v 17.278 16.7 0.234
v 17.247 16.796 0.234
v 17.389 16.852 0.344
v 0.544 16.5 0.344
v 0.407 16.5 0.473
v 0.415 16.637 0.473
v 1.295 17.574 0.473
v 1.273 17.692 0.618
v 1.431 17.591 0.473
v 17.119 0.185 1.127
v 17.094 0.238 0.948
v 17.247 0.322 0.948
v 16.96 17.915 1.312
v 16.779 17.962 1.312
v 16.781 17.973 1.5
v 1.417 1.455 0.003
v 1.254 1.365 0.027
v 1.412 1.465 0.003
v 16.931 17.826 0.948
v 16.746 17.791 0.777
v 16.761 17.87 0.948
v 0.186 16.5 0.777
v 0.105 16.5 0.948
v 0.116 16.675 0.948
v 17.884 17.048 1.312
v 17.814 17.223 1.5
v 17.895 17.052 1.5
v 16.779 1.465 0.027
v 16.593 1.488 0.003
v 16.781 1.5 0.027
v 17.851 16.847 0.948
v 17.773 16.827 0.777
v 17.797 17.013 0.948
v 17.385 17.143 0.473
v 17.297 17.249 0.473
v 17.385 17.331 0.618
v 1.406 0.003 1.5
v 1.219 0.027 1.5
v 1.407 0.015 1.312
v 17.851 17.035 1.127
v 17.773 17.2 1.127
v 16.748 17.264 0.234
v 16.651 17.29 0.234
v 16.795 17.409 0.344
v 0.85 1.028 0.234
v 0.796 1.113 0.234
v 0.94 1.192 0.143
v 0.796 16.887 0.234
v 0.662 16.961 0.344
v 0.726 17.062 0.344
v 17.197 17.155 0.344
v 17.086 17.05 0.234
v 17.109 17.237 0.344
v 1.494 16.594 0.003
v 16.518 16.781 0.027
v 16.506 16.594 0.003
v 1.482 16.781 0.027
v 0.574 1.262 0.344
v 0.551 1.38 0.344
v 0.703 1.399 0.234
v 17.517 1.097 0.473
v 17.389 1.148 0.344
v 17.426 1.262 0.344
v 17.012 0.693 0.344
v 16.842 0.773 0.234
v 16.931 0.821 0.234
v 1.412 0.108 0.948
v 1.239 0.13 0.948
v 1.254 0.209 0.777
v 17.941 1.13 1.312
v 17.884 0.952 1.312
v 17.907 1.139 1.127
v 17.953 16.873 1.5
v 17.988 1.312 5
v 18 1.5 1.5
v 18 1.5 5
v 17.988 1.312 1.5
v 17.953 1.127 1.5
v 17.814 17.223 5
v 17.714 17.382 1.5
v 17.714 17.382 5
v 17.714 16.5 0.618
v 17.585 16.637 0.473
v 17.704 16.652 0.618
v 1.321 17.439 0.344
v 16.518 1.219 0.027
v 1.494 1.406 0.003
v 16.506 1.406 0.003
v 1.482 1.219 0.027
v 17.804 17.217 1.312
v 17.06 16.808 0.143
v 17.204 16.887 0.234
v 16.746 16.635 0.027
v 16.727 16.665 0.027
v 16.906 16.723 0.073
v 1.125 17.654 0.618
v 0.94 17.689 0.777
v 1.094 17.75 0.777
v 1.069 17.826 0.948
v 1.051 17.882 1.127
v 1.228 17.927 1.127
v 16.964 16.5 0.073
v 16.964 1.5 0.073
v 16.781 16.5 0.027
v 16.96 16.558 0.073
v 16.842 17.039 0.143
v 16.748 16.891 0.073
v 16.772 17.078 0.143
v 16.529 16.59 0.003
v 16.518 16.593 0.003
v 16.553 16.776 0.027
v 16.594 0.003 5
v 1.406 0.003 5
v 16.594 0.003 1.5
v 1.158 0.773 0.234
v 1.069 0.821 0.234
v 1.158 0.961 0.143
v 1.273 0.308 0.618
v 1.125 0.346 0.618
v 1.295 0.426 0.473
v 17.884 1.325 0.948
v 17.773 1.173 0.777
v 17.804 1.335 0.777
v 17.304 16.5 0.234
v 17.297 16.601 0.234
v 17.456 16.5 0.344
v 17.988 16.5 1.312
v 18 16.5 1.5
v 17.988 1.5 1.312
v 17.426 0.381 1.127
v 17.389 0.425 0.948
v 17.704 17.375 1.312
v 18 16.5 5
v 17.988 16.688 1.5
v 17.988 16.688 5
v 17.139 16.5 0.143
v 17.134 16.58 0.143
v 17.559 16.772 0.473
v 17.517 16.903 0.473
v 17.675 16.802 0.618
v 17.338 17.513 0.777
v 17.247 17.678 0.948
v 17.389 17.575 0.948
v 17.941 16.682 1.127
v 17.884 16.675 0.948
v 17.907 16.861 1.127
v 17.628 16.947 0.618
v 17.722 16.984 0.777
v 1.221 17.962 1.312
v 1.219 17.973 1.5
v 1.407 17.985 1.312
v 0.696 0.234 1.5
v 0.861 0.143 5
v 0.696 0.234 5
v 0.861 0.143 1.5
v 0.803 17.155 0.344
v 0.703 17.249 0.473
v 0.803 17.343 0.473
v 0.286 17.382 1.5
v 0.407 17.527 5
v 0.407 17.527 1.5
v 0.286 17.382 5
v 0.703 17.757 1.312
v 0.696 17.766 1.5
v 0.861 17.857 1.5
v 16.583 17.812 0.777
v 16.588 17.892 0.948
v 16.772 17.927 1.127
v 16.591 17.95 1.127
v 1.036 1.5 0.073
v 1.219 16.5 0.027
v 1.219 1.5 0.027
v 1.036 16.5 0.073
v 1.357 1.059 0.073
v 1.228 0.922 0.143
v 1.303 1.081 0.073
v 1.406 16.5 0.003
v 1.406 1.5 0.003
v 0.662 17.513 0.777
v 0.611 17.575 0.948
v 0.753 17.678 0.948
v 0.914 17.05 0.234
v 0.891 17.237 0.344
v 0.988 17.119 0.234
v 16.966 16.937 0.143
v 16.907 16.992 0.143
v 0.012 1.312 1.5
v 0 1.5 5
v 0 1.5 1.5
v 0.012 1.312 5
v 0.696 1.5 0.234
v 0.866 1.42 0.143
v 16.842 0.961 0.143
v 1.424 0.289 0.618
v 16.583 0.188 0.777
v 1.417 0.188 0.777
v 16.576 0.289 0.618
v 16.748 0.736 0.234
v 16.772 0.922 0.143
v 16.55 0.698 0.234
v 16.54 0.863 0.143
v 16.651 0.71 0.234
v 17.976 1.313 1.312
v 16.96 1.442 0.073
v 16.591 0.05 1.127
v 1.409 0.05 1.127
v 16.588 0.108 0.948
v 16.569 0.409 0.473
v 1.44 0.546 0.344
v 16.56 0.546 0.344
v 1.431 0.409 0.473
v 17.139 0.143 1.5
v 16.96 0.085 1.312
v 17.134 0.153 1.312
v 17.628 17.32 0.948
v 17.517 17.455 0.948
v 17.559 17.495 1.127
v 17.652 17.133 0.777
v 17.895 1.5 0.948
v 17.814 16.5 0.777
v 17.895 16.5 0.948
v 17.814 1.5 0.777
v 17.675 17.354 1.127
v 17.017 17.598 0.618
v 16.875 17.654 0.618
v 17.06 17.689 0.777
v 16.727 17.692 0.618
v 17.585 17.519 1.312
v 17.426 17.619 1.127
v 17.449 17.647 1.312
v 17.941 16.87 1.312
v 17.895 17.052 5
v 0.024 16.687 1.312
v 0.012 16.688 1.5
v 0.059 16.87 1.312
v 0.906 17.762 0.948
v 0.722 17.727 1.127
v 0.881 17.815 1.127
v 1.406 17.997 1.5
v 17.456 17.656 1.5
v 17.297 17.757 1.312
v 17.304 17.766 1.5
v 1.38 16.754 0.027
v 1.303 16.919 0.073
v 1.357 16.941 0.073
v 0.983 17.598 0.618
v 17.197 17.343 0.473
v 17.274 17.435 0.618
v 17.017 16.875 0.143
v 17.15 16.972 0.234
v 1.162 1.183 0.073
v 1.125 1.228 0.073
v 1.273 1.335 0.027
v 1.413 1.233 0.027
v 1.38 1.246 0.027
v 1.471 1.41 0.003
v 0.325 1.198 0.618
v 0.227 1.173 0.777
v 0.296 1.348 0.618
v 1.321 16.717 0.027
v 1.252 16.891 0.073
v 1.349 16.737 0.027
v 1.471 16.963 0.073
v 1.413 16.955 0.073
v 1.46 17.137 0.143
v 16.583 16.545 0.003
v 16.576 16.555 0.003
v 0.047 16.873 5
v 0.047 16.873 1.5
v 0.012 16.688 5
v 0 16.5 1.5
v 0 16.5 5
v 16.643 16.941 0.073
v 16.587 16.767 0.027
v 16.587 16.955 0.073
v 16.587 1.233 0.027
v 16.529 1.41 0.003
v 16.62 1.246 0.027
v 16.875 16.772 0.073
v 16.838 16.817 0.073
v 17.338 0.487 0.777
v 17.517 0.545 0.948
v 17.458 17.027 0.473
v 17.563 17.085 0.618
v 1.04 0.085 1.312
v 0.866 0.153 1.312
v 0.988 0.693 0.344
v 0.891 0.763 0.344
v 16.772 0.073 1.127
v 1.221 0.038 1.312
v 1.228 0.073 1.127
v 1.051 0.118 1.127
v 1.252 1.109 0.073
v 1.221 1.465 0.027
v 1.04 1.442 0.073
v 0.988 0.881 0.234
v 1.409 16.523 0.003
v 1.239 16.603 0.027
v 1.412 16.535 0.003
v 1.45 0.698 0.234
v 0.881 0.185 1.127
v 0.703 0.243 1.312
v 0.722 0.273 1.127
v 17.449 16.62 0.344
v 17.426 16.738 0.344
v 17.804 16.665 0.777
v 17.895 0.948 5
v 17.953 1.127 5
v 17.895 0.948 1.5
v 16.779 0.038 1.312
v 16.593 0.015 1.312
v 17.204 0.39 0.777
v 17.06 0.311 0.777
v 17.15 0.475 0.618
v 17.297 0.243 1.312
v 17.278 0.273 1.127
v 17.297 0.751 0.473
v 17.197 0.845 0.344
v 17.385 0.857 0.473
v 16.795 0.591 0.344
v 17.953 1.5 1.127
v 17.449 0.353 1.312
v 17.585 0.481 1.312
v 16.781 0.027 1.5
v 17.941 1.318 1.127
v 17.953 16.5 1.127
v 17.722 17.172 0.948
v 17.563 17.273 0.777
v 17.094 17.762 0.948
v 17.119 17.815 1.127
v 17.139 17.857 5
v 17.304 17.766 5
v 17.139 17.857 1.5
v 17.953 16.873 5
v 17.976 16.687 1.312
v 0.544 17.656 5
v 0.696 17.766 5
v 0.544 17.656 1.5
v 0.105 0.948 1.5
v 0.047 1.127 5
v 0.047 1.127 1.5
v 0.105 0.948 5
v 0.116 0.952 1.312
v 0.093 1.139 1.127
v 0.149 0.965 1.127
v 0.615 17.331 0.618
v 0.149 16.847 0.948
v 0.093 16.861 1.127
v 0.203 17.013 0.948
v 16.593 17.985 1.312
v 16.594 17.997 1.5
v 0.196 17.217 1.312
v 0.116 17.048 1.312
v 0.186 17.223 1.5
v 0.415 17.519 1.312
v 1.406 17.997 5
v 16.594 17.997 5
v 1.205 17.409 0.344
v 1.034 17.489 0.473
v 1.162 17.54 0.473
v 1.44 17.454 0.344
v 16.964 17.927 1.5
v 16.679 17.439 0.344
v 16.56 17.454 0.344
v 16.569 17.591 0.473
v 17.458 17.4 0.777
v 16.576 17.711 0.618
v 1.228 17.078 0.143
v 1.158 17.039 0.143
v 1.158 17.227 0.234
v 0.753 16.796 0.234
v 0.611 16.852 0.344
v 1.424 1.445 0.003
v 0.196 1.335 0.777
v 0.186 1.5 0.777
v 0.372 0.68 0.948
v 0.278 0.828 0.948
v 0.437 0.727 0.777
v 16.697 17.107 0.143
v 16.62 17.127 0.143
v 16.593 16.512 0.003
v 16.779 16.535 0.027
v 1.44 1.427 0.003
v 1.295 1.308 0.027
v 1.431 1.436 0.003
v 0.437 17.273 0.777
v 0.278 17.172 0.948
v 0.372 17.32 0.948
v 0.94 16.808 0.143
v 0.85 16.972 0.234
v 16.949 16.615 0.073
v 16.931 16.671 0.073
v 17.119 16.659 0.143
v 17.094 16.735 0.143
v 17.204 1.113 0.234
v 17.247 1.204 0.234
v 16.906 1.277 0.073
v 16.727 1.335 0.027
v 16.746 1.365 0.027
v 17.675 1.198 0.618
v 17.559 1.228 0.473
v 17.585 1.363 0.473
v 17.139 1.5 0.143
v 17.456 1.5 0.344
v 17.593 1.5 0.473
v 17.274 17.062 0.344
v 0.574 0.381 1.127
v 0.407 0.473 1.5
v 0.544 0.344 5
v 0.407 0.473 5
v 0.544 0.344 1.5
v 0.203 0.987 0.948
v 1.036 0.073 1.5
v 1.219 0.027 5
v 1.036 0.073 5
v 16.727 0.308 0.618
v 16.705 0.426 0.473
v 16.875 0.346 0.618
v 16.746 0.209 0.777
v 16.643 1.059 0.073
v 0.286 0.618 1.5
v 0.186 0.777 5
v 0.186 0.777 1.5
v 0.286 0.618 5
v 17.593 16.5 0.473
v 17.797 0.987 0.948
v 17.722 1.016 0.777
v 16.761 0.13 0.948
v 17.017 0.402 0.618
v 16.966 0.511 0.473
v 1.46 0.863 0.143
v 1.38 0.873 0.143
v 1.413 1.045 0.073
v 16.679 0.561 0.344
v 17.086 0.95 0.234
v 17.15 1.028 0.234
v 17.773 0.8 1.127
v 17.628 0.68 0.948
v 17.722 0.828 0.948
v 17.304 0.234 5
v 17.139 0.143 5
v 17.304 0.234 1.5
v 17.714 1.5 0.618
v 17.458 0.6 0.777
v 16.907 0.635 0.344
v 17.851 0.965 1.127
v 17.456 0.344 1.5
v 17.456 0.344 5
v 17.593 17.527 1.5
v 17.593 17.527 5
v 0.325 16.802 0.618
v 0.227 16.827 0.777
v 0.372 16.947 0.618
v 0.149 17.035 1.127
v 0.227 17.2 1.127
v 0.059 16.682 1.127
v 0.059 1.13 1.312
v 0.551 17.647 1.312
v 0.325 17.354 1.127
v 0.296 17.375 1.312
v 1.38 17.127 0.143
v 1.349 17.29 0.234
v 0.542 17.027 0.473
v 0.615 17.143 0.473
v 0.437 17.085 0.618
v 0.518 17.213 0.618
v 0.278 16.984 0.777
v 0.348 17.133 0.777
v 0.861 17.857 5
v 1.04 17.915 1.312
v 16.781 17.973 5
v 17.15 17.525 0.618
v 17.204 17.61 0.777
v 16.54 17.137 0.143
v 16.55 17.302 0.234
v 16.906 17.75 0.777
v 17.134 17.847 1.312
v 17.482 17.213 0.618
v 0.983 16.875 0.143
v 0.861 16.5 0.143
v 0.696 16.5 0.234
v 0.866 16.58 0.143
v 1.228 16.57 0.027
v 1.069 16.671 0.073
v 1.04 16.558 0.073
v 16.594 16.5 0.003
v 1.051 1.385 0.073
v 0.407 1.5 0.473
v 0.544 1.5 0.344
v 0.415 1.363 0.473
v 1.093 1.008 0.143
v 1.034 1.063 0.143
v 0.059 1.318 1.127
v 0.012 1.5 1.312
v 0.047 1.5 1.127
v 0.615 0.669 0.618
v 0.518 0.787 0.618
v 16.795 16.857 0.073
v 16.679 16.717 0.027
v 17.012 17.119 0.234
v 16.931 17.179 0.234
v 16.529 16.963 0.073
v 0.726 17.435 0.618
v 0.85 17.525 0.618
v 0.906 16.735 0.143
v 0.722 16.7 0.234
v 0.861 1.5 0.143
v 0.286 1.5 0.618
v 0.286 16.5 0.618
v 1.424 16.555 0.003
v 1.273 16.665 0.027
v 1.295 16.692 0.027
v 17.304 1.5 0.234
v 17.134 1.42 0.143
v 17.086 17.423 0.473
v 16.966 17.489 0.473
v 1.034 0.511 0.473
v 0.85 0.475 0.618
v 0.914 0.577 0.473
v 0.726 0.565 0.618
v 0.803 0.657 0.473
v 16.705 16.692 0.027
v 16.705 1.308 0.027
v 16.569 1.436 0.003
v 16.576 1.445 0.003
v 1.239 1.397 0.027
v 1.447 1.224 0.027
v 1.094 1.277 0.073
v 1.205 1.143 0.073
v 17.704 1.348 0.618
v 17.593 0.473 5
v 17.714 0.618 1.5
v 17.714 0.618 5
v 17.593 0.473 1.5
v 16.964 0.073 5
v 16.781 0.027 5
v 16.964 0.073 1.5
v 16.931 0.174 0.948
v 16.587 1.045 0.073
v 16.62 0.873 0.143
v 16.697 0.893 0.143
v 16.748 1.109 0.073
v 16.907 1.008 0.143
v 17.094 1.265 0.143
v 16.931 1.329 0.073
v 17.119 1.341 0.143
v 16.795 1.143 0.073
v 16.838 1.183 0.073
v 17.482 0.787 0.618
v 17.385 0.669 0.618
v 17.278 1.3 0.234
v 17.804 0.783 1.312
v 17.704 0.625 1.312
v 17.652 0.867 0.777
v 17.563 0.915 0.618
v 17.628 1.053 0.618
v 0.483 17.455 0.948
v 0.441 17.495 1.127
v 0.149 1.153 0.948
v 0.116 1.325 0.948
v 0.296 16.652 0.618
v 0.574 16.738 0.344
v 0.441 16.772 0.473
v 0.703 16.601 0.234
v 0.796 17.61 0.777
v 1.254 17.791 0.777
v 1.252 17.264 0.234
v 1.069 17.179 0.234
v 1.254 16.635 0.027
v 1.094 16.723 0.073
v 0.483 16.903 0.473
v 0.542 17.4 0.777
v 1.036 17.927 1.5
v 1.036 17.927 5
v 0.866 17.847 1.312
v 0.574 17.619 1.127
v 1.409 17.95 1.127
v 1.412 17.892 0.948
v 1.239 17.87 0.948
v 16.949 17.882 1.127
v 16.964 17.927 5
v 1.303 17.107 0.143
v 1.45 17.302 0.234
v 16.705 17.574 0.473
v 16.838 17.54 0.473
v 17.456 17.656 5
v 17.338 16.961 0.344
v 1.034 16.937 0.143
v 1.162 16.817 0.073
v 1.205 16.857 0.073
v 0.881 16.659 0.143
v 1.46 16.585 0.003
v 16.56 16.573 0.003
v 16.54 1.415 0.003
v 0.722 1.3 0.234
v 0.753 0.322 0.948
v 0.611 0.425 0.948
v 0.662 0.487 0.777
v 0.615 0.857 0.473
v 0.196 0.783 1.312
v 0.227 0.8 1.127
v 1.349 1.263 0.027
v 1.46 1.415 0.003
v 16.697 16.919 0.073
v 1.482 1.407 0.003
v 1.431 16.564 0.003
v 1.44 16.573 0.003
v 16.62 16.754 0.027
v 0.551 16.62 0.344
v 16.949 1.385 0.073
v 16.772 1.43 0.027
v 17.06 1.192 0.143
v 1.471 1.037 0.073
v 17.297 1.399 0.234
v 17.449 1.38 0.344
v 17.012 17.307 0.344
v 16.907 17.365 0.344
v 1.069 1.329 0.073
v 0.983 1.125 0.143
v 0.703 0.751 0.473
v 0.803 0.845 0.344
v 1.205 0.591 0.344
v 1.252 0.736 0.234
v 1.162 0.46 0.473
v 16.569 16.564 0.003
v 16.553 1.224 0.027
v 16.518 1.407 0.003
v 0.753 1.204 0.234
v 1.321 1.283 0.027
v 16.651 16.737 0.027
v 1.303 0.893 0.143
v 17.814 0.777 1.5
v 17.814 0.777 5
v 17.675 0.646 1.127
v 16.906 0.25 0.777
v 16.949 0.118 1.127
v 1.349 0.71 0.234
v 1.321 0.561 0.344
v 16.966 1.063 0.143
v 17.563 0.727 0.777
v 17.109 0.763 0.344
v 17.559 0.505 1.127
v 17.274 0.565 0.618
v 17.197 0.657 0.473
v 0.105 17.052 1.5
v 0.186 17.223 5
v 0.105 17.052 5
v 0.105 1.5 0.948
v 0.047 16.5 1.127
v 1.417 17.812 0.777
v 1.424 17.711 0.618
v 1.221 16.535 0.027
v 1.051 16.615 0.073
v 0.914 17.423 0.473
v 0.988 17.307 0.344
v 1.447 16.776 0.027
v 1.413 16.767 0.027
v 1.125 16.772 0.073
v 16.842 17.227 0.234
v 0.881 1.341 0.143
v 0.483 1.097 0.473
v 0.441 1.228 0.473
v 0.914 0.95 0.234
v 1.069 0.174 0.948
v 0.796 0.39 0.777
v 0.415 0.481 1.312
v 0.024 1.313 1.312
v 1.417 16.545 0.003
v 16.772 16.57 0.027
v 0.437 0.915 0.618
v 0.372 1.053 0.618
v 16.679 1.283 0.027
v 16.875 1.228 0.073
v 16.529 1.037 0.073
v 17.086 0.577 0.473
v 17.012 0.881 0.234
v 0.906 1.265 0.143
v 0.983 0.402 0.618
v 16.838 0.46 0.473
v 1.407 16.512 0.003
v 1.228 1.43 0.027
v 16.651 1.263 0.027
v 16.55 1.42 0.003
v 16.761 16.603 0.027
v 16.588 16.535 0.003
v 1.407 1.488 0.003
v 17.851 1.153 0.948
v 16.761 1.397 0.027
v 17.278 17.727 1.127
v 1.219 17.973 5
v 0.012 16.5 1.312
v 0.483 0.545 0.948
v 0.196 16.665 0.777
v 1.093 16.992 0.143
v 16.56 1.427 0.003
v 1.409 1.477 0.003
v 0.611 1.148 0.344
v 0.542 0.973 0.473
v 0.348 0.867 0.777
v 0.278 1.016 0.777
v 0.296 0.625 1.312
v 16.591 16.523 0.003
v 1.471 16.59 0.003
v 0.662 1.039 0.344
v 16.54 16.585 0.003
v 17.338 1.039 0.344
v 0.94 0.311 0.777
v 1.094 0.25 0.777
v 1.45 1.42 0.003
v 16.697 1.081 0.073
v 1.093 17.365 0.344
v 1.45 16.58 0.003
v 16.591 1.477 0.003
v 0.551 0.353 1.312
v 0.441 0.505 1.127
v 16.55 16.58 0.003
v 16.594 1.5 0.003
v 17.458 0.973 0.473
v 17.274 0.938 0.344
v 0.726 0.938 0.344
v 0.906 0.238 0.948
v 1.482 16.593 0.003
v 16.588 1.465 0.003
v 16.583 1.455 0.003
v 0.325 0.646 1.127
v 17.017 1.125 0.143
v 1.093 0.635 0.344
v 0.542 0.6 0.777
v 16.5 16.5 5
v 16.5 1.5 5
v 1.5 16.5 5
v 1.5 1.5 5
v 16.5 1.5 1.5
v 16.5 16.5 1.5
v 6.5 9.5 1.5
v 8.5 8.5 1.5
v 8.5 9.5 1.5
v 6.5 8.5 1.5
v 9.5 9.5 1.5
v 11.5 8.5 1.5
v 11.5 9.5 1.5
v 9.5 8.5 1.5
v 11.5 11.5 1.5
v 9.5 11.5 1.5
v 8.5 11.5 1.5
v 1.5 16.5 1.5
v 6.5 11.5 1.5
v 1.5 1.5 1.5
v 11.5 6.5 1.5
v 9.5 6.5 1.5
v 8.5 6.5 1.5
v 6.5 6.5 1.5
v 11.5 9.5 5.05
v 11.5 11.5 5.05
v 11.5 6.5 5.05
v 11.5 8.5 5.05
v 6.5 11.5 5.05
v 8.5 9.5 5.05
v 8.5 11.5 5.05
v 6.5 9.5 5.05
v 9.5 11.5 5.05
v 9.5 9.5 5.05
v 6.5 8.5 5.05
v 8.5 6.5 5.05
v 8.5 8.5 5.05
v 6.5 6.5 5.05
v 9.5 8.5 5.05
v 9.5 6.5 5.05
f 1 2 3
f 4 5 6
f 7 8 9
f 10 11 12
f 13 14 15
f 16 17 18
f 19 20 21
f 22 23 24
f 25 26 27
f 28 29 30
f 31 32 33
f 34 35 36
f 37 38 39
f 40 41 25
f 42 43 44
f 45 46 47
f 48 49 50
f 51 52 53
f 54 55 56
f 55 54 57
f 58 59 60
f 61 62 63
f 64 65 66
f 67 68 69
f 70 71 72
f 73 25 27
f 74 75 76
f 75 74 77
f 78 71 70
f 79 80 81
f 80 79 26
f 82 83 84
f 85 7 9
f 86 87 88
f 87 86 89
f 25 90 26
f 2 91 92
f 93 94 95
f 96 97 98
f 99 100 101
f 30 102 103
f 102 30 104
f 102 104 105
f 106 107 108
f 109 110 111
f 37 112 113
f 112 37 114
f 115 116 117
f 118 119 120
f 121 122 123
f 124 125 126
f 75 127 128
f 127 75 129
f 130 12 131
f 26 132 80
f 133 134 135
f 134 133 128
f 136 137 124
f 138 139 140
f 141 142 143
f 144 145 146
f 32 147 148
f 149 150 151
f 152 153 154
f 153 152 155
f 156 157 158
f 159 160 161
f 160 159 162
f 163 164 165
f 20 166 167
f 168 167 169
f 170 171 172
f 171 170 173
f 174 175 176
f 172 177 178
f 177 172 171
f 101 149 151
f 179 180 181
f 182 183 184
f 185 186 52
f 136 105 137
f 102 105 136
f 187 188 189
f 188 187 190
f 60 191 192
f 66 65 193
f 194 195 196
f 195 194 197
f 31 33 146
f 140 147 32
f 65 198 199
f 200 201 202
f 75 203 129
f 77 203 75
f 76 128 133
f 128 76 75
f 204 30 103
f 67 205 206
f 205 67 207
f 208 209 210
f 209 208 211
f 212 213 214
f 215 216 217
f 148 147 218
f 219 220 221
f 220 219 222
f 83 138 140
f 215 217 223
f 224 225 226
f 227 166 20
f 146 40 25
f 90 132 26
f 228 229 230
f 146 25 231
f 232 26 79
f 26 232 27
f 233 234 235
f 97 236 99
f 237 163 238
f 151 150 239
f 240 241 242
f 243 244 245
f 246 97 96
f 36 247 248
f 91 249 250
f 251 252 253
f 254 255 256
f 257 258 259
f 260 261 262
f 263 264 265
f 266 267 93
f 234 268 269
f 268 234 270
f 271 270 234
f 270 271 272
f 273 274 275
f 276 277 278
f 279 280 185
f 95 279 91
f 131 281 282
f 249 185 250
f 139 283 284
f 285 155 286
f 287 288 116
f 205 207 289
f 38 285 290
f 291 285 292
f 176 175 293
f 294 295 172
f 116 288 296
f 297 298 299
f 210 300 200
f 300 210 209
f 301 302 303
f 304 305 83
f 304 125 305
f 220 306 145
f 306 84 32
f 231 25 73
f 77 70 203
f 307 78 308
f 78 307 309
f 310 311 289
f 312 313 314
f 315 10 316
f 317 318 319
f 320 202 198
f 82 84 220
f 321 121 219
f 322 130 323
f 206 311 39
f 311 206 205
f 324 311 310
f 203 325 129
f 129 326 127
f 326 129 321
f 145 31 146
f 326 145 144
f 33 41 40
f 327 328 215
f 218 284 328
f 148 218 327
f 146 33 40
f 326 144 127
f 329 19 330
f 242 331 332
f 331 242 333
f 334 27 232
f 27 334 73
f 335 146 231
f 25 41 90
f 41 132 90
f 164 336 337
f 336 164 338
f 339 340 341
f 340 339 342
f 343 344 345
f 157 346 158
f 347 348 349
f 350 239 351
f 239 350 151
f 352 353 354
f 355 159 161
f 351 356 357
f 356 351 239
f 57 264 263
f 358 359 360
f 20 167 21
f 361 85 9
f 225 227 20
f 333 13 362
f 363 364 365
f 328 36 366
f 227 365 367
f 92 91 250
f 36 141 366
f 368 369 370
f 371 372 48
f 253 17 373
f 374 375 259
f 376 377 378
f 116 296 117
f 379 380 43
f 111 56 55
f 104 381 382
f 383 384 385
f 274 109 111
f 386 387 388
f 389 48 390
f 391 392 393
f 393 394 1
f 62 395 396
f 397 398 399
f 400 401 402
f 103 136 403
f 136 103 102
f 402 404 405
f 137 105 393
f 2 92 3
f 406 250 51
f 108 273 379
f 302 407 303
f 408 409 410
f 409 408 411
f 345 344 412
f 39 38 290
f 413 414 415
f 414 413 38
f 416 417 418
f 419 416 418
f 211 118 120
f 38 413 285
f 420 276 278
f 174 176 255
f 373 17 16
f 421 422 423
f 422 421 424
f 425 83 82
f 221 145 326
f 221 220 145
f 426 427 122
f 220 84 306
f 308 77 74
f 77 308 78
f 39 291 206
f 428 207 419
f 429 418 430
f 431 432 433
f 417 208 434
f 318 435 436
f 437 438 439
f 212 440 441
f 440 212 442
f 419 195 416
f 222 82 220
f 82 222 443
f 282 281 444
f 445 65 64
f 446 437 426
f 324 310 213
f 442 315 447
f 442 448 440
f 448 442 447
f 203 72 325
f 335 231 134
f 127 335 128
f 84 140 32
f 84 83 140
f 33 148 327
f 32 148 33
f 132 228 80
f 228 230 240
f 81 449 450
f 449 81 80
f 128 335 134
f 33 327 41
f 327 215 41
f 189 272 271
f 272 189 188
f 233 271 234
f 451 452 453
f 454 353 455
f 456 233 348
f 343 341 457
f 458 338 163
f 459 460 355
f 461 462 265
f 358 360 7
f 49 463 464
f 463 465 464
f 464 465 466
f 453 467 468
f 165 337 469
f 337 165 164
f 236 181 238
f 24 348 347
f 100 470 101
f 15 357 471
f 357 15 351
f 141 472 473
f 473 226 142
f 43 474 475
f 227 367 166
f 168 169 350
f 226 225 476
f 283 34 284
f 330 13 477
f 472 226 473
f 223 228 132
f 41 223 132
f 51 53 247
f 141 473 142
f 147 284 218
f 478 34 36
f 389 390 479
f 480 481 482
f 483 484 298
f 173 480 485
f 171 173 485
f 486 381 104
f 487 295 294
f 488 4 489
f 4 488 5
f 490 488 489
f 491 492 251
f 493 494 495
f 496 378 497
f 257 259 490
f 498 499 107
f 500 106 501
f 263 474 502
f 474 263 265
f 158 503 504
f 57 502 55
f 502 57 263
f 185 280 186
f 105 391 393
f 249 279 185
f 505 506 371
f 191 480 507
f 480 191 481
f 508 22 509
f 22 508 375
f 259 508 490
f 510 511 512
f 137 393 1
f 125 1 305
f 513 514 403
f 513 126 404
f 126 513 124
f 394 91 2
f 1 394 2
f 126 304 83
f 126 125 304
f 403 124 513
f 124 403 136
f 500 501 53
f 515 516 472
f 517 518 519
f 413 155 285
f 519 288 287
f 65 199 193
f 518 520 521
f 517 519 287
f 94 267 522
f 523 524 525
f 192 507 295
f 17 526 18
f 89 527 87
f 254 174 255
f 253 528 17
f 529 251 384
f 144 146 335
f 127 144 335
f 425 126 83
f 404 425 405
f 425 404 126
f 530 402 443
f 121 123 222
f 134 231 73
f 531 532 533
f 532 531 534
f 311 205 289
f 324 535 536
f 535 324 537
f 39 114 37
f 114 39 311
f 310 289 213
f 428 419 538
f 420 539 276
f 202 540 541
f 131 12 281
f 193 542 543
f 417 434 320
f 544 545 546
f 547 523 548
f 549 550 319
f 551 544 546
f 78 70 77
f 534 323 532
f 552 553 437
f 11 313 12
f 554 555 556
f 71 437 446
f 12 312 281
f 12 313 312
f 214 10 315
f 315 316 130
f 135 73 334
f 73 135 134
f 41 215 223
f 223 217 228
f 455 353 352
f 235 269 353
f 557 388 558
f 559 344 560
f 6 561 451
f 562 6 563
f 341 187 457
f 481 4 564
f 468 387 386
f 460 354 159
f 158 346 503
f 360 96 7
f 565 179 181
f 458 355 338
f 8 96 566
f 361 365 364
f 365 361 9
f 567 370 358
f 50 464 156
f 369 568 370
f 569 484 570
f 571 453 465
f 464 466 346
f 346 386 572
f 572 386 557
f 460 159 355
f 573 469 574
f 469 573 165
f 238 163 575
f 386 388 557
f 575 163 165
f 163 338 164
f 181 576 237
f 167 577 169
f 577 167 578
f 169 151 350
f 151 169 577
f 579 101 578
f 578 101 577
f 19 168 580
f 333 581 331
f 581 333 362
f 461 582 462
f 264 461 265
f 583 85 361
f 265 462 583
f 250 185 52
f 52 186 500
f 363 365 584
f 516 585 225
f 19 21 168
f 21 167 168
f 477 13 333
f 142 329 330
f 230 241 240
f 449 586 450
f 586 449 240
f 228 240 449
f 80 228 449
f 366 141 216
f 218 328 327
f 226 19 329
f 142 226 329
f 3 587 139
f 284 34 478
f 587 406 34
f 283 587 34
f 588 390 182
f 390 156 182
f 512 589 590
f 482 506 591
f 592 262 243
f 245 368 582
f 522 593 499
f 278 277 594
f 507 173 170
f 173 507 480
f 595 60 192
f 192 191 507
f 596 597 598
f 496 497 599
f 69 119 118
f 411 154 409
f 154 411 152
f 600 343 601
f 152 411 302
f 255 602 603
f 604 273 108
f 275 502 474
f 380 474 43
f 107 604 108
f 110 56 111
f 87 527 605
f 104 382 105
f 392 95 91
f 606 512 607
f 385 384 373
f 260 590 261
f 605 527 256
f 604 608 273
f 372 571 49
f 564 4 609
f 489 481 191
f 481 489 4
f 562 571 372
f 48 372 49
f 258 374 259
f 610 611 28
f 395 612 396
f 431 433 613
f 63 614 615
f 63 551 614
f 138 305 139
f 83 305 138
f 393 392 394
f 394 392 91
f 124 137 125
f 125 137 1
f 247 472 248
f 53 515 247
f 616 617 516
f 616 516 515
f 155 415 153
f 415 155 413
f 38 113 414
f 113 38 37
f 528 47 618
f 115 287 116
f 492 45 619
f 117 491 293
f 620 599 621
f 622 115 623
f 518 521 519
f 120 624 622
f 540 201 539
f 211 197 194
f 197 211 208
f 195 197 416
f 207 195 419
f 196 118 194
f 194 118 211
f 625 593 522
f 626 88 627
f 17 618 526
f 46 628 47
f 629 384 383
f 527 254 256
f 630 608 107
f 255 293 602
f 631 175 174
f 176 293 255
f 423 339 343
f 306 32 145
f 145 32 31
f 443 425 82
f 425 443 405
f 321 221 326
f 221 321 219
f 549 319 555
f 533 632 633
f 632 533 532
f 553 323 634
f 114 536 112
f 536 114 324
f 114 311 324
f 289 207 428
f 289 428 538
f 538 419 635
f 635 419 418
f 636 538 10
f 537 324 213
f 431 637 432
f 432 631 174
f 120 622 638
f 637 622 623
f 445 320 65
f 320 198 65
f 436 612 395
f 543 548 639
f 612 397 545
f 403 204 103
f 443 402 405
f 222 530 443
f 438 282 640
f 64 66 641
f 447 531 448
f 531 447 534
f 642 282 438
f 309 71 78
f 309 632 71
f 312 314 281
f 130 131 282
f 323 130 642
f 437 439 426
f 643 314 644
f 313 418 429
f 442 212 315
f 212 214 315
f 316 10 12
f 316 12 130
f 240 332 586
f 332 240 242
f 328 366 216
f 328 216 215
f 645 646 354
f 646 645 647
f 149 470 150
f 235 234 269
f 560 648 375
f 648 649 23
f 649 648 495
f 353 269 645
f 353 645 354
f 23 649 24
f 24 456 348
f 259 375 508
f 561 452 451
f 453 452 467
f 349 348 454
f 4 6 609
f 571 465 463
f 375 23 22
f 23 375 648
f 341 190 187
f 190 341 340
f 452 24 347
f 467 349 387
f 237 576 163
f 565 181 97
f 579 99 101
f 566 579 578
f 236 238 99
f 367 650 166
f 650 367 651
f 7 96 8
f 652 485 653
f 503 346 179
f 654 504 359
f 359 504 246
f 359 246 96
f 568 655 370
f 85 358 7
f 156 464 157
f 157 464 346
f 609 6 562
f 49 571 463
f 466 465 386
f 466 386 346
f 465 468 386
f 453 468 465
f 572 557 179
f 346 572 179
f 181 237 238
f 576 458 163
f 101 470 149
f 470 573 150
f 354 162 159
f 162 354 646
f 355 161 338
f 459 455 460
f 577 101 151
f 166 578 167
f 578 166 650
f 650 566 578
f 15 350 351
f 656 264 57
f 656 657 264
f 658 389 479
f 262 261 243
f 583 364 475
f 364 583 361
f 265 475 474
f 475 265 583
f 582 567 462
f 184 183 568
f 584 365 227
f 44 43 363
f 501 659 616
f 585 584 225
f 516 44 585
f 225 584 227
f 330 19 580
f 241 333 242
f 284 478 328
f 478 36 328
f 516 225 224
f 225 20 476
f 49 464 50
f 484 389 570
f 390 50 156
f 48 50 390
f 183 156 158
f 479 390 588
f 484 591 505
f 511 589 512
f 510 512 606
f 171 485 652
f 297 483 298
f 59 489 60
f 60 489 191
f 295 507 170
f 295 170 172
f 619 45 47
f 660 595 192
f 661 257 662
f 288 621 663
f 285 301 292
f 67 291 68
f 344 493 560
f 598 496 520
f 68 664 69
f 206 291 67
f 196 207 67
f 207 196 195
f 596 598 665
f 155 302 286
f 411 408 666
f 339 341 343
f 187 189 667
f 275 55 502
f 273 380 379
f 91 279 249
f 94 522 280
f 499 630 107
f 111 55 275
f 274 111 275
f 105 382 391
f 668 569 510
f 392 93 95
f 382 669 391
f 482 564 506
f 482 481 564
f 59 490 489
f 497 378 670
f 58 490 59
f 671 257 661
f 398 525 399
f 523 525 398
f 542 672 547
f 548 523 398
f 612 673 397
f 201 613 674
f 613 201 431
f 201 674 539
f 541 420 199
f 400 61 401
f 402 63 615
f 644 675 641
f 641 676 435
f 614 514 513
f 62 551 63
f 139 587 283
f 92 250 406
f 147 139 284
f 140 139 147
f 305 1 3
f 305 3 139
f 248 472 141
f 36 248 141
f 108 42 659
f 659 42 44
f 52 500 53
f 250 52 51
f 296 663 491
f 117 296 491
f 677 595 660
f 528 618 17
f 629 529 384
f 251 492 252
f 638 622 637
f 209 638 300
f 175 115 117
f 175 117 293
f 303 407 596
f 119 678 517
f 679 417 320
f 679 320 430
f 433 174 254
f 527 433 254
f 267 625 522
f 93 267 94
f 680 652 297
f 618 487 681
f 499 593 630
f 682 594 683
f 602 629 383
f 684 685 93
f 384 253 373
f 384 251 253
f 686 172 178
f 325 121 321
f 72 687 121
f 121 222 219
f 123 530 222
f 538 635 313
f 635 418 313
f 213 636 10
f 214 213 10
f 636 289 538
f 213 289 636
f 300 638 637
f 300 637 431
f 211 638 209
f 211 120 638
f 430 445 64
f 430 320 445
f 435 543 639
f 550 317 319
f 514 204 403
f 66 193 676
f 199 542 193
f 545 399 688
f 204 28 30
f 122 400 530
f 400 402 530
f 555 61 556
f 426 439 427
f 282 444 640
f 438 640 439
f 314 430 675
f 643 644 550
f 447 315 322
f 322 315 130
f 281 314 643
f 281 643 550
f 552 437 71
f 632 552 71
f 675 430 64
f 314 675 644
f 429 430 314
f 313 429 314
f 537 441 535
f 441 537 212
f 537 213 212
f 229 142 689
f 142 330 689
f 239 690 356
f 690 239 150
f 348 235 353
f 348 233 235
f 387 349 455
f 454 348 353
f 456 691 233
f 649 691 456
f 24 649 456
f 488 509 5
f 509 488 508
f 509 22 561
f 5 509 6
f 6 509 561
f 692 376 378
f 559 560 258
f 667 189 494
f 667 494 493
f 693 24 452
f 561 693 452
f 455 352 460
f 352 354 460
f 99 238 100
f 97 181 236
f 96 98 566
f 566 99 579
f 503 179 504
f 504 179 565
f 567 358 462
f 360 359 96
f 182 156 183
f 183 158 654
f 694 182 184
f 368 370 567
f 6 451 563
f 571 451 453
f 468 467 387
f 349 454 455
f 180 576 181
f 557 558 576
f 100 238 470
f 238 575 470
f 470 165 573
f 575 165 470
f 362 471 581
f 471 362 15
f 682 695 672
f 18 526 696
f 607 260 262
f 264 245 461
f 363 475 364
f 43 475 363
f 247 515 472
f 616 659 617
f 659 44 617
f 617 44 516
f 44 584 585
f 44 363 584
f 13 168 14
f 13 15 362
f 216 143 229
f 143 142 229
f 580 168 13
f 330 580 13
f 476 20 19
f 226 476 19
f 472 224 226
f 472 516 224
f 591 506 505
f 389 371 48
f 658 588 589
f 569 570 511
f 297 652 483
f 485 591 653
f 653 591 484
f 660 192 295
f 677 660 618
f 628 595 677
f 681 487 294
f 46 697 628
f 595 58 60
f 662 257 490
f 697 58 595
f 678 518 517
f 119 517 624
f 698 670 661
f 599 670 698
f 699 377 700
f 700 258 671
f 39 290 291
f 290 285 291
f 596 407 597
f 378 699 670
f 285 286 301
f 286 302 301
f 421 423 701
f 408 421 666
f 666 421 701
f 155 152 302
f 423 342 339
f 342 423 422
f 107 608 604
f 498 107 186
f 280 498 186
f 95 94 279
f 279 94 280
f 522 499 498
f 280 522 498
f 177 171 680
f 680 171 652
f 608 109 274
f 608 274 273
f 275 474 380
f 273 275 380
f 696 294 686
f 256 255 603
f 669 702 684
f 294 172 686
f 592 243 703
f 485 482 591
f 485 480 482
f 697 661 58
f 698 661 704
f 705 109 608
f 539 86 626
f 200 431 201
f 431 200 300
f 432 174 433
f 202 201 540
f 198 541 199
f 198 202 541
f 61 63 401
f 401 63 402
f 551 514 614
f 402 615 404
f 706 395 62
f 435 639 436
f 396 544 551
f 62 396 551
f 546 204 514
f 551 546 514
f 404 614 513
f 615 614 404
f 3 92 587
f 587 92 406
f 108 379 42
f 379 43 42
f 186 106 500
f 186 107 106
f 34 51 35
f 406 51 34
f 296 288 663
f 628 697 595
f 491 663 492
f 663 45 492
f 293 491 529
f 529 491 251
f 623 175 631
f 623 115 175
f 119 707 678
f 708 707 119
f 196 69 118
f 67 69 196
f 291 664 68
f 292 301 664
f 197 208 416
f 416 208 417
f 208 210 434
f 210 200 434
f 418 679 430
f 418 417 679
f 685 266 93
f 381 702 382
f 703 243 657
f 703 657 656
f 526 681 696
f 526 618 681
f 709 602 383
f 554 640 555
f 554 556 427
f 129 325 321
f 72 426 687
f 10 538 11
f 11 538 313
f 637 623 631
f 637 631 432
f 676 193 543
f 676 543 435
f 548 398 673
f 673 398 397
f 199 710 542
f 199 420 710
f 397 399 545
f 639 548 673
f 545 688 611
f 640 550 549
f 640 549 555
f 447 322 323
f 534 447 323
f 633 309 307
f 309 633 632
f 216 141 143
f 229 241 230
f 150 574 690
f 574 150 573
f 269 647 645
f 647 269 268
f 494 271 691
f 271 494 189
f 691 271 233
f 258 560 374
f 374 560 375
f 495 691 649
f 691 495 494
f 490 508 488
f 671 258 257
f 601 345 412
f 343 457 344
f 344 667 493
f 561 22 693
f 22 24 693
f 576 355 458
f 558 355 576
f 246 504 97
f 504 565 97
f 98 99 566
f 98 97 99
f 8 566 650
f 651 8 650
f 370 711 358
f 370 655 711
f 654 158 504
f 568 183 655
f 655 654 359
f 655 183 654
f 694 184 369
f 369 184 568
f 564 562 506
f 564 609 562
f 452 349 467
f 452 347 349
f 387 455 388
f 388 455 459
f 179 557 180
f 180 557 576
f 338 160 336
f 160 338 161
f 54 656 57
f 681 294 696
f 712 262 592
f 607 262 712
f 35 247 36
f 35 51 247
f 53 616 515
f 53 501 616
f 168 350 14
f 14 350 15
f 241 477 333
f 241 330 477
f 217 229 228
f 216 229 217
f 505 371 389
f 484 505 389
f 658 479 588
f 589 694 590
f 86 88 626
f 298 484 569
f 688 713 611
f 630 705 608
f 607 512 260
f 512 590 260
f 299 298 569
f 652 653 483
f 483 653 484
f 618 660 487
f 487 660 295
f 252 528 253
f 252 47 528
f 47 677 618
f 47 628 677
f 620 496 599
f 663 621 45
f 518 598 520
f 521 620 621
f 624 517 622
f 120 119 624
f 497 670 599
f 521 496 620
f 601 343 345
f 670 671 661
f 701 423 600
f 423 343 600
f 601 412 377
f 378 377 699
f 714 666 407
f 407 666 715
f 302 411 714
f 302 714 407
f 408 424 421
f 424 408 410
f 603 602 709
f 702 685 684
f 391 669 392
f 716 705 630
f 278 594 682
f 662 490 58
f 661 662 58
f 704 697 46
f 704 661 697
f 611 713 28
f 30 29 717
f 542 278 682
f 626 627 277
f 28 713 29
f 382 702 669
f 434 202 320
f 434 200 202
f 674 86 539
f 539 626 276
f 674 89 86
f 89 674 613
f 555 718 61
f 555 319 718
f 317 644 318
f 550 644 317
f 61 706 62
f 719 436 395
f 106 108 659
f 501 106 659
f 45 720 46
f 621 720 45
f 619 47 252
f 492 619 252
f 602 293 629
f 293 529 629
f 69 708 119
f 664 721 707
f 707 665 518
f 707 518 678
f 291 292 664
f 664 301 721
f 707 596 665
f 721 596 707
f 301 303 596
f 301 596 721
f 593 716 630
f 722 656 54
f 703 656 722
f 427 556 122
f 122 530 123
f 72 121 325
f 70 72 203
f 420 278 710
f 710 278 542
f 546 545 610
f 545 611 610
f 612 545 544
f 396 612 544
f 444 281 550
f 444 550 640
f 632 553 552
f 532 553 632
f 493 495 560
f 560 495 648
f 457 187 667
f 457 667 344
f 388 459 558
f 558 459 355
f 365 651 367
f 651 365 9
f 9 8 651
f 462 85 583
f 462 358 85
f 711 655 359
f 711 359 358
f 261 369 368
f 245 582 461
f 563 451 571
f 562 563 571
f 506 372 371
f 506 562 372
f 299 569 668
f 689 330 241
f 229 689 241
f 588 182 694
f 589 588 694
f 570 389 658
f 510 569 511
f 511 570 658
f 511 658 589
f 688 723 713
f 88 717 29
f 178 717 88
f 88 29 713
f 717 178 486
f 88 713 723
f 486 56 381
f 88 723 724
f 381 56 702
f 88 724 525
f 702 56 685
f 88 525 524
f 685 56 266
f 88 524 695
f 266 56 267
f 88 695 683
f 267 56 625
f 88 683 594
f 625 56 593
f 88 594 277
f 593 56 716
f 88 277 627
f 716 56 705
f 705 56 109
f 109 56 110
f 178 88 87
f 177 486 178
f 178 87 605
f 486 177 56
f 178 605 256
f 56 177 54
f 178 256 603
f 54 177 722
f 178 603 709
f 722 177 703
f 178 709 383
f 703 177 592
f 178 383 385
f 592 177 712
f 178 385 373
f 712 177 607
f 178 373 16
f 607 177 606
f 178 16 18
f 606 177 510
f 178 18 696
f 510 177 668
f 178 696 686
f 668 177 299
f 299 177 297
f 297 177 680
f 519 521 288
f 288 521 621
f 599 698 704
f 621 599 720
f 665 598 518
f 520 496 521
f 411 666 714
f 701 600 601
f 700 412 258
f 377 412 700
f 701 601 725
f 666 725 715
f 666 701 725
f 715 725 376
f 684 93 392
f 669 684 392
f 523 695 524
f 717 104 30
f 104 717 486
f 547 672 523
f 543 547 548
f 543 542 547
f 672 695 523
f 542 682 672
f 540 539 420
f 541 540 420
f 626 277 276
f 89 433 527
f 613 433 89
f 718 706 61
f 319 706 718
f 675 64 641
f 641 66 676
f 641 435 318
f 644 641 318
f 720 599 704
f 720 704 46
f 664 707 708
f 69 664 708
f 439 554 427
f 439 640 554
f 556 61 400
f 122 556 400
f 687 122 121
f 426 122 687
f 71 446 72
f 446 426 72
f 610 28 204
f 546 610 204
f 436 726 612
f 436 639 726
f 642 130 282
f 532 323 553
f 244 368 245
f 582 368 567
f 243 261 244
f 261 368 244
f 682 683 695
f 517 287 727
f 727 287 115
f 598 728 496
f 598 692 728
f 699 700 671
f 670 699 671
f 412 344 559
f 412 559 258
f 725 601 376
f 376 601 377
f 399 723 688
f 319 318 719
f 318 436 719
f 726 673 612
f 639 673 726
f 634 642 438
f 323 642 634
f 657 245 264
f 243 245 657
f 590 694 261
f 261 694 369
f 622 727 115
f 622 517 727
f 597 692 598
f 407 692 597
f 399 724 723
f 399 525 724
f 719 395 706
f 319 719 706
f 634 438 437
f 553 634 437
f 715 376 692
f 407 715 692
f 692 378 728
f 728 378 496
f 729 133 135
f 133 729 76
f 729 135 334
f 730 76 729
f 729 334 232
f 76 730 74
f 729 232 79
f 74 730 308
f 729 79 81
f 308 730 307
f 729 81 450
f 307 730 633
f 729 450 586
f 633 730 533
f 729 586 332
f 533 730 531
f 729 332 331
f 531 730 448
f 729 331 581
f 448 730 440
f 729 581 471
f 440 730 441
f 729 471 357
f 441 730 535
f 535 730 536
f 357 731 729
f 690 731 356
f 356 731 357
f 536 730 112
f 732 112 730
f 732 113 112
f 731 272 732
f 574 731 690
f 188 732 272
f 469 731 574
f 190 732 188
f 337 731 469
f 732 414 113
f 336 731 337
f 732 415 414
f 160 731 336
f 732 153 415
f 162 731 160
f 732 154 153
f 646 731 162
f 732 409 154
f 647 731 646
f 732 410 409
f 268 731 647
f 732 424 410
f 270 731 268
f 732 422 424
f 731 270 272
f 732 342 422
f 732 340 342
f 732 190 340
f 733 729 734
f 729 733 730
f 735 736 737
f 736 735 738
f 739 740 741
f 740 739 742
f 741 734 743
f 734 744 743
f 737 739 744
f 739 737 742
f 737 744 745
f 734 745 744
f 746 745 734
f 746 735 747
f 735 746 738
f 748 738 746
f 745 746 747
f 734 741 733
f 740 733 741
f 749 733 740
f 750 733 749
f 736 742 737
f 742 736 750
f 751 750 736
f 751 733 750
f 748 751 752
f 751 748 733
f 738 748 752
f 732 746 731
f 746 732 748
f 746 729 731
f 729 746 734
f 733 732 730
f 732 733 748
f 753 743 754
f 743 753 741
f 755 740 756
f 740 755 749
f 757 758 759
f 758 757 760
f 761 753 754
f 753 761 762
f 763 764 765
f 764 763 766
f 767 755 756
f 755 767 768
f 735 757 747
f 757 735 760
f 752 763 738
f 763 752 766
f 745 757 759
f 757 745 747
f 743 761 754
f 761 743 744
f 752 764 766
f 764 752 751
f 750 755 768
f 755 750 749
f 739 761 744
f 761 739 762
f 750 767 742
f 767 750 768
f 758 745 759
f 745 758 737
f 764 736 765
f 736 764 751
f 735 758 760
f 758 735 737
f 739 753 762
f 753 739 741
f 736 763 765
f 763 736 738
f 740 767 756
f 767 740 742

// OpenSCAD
keycap_size = 18;
keycap_height = 5;
keycap_thickness = 1.5;
bevel_size = 1.5;


module round_edge() {
    translate([bevel_size, bevel_size, bevel_size]) {
        sphere(r = bevel_size, $fn = 50);
        rotate(90, [0, 1, 0]) {
            cylinder(r = bevel_size, h = keycap_size - 2 * bevel_size, $fn=30);
        }
        translate([keycap_size - 2 * bevel_size, 0, 0]) sphere(r = bevel_size, $fn = 50);
    }
}


difference() {
    translate([bevel_size, bevel_size, bevel_size]) {
        minkowski() {
            flat_size = keycap_size - 2 * bevel_size;
            cube([flat_size, flat_size, keycap_height]);
            sphere(r = bevel_size, $fn=50);
        }
    }
    translate([-10, -10, keycap_height]) cube([100, 100, 100]);
    translate([keycap_thickness, keycap_thickness, keycap_thickness]) {
        milling_size = keycap_size - 2 * keycap_thickness;
        cube([milling_size, milling_size, 100]);
    }
}


module stem_round() {
    translate([keycap_size / 2, keycap_size / 2, 0.1]) {
        difference() {
            cylinder(d = 4.3 + 1, h = keycap_height - 0.1, $fn=40);
            translate([0, 0, keycap_height / 2]) {
                cube([1, 4.3, keycap_height + 2], center=true);
                rotate(90, [0, 0, 1]) cube([1, 4.3, keycap_height + 2], center=true);
            }
        }
    }
}


module stem_square() {
    translate([keycap_size / 2, keycap_size / 2, 0.1]) {
        translate([0, 0, keycap_height / 2]) {
            difference() {
                cube([5, 5, keycap_height - 0.1], center=true);
                cube([1, 7, keycap_height + 2], center=true);
                rotate(90, [0, 0, 1]) cube([1, 7, keycap_height + 2], center=true);
            }
        }
    }
}


stem_square();
